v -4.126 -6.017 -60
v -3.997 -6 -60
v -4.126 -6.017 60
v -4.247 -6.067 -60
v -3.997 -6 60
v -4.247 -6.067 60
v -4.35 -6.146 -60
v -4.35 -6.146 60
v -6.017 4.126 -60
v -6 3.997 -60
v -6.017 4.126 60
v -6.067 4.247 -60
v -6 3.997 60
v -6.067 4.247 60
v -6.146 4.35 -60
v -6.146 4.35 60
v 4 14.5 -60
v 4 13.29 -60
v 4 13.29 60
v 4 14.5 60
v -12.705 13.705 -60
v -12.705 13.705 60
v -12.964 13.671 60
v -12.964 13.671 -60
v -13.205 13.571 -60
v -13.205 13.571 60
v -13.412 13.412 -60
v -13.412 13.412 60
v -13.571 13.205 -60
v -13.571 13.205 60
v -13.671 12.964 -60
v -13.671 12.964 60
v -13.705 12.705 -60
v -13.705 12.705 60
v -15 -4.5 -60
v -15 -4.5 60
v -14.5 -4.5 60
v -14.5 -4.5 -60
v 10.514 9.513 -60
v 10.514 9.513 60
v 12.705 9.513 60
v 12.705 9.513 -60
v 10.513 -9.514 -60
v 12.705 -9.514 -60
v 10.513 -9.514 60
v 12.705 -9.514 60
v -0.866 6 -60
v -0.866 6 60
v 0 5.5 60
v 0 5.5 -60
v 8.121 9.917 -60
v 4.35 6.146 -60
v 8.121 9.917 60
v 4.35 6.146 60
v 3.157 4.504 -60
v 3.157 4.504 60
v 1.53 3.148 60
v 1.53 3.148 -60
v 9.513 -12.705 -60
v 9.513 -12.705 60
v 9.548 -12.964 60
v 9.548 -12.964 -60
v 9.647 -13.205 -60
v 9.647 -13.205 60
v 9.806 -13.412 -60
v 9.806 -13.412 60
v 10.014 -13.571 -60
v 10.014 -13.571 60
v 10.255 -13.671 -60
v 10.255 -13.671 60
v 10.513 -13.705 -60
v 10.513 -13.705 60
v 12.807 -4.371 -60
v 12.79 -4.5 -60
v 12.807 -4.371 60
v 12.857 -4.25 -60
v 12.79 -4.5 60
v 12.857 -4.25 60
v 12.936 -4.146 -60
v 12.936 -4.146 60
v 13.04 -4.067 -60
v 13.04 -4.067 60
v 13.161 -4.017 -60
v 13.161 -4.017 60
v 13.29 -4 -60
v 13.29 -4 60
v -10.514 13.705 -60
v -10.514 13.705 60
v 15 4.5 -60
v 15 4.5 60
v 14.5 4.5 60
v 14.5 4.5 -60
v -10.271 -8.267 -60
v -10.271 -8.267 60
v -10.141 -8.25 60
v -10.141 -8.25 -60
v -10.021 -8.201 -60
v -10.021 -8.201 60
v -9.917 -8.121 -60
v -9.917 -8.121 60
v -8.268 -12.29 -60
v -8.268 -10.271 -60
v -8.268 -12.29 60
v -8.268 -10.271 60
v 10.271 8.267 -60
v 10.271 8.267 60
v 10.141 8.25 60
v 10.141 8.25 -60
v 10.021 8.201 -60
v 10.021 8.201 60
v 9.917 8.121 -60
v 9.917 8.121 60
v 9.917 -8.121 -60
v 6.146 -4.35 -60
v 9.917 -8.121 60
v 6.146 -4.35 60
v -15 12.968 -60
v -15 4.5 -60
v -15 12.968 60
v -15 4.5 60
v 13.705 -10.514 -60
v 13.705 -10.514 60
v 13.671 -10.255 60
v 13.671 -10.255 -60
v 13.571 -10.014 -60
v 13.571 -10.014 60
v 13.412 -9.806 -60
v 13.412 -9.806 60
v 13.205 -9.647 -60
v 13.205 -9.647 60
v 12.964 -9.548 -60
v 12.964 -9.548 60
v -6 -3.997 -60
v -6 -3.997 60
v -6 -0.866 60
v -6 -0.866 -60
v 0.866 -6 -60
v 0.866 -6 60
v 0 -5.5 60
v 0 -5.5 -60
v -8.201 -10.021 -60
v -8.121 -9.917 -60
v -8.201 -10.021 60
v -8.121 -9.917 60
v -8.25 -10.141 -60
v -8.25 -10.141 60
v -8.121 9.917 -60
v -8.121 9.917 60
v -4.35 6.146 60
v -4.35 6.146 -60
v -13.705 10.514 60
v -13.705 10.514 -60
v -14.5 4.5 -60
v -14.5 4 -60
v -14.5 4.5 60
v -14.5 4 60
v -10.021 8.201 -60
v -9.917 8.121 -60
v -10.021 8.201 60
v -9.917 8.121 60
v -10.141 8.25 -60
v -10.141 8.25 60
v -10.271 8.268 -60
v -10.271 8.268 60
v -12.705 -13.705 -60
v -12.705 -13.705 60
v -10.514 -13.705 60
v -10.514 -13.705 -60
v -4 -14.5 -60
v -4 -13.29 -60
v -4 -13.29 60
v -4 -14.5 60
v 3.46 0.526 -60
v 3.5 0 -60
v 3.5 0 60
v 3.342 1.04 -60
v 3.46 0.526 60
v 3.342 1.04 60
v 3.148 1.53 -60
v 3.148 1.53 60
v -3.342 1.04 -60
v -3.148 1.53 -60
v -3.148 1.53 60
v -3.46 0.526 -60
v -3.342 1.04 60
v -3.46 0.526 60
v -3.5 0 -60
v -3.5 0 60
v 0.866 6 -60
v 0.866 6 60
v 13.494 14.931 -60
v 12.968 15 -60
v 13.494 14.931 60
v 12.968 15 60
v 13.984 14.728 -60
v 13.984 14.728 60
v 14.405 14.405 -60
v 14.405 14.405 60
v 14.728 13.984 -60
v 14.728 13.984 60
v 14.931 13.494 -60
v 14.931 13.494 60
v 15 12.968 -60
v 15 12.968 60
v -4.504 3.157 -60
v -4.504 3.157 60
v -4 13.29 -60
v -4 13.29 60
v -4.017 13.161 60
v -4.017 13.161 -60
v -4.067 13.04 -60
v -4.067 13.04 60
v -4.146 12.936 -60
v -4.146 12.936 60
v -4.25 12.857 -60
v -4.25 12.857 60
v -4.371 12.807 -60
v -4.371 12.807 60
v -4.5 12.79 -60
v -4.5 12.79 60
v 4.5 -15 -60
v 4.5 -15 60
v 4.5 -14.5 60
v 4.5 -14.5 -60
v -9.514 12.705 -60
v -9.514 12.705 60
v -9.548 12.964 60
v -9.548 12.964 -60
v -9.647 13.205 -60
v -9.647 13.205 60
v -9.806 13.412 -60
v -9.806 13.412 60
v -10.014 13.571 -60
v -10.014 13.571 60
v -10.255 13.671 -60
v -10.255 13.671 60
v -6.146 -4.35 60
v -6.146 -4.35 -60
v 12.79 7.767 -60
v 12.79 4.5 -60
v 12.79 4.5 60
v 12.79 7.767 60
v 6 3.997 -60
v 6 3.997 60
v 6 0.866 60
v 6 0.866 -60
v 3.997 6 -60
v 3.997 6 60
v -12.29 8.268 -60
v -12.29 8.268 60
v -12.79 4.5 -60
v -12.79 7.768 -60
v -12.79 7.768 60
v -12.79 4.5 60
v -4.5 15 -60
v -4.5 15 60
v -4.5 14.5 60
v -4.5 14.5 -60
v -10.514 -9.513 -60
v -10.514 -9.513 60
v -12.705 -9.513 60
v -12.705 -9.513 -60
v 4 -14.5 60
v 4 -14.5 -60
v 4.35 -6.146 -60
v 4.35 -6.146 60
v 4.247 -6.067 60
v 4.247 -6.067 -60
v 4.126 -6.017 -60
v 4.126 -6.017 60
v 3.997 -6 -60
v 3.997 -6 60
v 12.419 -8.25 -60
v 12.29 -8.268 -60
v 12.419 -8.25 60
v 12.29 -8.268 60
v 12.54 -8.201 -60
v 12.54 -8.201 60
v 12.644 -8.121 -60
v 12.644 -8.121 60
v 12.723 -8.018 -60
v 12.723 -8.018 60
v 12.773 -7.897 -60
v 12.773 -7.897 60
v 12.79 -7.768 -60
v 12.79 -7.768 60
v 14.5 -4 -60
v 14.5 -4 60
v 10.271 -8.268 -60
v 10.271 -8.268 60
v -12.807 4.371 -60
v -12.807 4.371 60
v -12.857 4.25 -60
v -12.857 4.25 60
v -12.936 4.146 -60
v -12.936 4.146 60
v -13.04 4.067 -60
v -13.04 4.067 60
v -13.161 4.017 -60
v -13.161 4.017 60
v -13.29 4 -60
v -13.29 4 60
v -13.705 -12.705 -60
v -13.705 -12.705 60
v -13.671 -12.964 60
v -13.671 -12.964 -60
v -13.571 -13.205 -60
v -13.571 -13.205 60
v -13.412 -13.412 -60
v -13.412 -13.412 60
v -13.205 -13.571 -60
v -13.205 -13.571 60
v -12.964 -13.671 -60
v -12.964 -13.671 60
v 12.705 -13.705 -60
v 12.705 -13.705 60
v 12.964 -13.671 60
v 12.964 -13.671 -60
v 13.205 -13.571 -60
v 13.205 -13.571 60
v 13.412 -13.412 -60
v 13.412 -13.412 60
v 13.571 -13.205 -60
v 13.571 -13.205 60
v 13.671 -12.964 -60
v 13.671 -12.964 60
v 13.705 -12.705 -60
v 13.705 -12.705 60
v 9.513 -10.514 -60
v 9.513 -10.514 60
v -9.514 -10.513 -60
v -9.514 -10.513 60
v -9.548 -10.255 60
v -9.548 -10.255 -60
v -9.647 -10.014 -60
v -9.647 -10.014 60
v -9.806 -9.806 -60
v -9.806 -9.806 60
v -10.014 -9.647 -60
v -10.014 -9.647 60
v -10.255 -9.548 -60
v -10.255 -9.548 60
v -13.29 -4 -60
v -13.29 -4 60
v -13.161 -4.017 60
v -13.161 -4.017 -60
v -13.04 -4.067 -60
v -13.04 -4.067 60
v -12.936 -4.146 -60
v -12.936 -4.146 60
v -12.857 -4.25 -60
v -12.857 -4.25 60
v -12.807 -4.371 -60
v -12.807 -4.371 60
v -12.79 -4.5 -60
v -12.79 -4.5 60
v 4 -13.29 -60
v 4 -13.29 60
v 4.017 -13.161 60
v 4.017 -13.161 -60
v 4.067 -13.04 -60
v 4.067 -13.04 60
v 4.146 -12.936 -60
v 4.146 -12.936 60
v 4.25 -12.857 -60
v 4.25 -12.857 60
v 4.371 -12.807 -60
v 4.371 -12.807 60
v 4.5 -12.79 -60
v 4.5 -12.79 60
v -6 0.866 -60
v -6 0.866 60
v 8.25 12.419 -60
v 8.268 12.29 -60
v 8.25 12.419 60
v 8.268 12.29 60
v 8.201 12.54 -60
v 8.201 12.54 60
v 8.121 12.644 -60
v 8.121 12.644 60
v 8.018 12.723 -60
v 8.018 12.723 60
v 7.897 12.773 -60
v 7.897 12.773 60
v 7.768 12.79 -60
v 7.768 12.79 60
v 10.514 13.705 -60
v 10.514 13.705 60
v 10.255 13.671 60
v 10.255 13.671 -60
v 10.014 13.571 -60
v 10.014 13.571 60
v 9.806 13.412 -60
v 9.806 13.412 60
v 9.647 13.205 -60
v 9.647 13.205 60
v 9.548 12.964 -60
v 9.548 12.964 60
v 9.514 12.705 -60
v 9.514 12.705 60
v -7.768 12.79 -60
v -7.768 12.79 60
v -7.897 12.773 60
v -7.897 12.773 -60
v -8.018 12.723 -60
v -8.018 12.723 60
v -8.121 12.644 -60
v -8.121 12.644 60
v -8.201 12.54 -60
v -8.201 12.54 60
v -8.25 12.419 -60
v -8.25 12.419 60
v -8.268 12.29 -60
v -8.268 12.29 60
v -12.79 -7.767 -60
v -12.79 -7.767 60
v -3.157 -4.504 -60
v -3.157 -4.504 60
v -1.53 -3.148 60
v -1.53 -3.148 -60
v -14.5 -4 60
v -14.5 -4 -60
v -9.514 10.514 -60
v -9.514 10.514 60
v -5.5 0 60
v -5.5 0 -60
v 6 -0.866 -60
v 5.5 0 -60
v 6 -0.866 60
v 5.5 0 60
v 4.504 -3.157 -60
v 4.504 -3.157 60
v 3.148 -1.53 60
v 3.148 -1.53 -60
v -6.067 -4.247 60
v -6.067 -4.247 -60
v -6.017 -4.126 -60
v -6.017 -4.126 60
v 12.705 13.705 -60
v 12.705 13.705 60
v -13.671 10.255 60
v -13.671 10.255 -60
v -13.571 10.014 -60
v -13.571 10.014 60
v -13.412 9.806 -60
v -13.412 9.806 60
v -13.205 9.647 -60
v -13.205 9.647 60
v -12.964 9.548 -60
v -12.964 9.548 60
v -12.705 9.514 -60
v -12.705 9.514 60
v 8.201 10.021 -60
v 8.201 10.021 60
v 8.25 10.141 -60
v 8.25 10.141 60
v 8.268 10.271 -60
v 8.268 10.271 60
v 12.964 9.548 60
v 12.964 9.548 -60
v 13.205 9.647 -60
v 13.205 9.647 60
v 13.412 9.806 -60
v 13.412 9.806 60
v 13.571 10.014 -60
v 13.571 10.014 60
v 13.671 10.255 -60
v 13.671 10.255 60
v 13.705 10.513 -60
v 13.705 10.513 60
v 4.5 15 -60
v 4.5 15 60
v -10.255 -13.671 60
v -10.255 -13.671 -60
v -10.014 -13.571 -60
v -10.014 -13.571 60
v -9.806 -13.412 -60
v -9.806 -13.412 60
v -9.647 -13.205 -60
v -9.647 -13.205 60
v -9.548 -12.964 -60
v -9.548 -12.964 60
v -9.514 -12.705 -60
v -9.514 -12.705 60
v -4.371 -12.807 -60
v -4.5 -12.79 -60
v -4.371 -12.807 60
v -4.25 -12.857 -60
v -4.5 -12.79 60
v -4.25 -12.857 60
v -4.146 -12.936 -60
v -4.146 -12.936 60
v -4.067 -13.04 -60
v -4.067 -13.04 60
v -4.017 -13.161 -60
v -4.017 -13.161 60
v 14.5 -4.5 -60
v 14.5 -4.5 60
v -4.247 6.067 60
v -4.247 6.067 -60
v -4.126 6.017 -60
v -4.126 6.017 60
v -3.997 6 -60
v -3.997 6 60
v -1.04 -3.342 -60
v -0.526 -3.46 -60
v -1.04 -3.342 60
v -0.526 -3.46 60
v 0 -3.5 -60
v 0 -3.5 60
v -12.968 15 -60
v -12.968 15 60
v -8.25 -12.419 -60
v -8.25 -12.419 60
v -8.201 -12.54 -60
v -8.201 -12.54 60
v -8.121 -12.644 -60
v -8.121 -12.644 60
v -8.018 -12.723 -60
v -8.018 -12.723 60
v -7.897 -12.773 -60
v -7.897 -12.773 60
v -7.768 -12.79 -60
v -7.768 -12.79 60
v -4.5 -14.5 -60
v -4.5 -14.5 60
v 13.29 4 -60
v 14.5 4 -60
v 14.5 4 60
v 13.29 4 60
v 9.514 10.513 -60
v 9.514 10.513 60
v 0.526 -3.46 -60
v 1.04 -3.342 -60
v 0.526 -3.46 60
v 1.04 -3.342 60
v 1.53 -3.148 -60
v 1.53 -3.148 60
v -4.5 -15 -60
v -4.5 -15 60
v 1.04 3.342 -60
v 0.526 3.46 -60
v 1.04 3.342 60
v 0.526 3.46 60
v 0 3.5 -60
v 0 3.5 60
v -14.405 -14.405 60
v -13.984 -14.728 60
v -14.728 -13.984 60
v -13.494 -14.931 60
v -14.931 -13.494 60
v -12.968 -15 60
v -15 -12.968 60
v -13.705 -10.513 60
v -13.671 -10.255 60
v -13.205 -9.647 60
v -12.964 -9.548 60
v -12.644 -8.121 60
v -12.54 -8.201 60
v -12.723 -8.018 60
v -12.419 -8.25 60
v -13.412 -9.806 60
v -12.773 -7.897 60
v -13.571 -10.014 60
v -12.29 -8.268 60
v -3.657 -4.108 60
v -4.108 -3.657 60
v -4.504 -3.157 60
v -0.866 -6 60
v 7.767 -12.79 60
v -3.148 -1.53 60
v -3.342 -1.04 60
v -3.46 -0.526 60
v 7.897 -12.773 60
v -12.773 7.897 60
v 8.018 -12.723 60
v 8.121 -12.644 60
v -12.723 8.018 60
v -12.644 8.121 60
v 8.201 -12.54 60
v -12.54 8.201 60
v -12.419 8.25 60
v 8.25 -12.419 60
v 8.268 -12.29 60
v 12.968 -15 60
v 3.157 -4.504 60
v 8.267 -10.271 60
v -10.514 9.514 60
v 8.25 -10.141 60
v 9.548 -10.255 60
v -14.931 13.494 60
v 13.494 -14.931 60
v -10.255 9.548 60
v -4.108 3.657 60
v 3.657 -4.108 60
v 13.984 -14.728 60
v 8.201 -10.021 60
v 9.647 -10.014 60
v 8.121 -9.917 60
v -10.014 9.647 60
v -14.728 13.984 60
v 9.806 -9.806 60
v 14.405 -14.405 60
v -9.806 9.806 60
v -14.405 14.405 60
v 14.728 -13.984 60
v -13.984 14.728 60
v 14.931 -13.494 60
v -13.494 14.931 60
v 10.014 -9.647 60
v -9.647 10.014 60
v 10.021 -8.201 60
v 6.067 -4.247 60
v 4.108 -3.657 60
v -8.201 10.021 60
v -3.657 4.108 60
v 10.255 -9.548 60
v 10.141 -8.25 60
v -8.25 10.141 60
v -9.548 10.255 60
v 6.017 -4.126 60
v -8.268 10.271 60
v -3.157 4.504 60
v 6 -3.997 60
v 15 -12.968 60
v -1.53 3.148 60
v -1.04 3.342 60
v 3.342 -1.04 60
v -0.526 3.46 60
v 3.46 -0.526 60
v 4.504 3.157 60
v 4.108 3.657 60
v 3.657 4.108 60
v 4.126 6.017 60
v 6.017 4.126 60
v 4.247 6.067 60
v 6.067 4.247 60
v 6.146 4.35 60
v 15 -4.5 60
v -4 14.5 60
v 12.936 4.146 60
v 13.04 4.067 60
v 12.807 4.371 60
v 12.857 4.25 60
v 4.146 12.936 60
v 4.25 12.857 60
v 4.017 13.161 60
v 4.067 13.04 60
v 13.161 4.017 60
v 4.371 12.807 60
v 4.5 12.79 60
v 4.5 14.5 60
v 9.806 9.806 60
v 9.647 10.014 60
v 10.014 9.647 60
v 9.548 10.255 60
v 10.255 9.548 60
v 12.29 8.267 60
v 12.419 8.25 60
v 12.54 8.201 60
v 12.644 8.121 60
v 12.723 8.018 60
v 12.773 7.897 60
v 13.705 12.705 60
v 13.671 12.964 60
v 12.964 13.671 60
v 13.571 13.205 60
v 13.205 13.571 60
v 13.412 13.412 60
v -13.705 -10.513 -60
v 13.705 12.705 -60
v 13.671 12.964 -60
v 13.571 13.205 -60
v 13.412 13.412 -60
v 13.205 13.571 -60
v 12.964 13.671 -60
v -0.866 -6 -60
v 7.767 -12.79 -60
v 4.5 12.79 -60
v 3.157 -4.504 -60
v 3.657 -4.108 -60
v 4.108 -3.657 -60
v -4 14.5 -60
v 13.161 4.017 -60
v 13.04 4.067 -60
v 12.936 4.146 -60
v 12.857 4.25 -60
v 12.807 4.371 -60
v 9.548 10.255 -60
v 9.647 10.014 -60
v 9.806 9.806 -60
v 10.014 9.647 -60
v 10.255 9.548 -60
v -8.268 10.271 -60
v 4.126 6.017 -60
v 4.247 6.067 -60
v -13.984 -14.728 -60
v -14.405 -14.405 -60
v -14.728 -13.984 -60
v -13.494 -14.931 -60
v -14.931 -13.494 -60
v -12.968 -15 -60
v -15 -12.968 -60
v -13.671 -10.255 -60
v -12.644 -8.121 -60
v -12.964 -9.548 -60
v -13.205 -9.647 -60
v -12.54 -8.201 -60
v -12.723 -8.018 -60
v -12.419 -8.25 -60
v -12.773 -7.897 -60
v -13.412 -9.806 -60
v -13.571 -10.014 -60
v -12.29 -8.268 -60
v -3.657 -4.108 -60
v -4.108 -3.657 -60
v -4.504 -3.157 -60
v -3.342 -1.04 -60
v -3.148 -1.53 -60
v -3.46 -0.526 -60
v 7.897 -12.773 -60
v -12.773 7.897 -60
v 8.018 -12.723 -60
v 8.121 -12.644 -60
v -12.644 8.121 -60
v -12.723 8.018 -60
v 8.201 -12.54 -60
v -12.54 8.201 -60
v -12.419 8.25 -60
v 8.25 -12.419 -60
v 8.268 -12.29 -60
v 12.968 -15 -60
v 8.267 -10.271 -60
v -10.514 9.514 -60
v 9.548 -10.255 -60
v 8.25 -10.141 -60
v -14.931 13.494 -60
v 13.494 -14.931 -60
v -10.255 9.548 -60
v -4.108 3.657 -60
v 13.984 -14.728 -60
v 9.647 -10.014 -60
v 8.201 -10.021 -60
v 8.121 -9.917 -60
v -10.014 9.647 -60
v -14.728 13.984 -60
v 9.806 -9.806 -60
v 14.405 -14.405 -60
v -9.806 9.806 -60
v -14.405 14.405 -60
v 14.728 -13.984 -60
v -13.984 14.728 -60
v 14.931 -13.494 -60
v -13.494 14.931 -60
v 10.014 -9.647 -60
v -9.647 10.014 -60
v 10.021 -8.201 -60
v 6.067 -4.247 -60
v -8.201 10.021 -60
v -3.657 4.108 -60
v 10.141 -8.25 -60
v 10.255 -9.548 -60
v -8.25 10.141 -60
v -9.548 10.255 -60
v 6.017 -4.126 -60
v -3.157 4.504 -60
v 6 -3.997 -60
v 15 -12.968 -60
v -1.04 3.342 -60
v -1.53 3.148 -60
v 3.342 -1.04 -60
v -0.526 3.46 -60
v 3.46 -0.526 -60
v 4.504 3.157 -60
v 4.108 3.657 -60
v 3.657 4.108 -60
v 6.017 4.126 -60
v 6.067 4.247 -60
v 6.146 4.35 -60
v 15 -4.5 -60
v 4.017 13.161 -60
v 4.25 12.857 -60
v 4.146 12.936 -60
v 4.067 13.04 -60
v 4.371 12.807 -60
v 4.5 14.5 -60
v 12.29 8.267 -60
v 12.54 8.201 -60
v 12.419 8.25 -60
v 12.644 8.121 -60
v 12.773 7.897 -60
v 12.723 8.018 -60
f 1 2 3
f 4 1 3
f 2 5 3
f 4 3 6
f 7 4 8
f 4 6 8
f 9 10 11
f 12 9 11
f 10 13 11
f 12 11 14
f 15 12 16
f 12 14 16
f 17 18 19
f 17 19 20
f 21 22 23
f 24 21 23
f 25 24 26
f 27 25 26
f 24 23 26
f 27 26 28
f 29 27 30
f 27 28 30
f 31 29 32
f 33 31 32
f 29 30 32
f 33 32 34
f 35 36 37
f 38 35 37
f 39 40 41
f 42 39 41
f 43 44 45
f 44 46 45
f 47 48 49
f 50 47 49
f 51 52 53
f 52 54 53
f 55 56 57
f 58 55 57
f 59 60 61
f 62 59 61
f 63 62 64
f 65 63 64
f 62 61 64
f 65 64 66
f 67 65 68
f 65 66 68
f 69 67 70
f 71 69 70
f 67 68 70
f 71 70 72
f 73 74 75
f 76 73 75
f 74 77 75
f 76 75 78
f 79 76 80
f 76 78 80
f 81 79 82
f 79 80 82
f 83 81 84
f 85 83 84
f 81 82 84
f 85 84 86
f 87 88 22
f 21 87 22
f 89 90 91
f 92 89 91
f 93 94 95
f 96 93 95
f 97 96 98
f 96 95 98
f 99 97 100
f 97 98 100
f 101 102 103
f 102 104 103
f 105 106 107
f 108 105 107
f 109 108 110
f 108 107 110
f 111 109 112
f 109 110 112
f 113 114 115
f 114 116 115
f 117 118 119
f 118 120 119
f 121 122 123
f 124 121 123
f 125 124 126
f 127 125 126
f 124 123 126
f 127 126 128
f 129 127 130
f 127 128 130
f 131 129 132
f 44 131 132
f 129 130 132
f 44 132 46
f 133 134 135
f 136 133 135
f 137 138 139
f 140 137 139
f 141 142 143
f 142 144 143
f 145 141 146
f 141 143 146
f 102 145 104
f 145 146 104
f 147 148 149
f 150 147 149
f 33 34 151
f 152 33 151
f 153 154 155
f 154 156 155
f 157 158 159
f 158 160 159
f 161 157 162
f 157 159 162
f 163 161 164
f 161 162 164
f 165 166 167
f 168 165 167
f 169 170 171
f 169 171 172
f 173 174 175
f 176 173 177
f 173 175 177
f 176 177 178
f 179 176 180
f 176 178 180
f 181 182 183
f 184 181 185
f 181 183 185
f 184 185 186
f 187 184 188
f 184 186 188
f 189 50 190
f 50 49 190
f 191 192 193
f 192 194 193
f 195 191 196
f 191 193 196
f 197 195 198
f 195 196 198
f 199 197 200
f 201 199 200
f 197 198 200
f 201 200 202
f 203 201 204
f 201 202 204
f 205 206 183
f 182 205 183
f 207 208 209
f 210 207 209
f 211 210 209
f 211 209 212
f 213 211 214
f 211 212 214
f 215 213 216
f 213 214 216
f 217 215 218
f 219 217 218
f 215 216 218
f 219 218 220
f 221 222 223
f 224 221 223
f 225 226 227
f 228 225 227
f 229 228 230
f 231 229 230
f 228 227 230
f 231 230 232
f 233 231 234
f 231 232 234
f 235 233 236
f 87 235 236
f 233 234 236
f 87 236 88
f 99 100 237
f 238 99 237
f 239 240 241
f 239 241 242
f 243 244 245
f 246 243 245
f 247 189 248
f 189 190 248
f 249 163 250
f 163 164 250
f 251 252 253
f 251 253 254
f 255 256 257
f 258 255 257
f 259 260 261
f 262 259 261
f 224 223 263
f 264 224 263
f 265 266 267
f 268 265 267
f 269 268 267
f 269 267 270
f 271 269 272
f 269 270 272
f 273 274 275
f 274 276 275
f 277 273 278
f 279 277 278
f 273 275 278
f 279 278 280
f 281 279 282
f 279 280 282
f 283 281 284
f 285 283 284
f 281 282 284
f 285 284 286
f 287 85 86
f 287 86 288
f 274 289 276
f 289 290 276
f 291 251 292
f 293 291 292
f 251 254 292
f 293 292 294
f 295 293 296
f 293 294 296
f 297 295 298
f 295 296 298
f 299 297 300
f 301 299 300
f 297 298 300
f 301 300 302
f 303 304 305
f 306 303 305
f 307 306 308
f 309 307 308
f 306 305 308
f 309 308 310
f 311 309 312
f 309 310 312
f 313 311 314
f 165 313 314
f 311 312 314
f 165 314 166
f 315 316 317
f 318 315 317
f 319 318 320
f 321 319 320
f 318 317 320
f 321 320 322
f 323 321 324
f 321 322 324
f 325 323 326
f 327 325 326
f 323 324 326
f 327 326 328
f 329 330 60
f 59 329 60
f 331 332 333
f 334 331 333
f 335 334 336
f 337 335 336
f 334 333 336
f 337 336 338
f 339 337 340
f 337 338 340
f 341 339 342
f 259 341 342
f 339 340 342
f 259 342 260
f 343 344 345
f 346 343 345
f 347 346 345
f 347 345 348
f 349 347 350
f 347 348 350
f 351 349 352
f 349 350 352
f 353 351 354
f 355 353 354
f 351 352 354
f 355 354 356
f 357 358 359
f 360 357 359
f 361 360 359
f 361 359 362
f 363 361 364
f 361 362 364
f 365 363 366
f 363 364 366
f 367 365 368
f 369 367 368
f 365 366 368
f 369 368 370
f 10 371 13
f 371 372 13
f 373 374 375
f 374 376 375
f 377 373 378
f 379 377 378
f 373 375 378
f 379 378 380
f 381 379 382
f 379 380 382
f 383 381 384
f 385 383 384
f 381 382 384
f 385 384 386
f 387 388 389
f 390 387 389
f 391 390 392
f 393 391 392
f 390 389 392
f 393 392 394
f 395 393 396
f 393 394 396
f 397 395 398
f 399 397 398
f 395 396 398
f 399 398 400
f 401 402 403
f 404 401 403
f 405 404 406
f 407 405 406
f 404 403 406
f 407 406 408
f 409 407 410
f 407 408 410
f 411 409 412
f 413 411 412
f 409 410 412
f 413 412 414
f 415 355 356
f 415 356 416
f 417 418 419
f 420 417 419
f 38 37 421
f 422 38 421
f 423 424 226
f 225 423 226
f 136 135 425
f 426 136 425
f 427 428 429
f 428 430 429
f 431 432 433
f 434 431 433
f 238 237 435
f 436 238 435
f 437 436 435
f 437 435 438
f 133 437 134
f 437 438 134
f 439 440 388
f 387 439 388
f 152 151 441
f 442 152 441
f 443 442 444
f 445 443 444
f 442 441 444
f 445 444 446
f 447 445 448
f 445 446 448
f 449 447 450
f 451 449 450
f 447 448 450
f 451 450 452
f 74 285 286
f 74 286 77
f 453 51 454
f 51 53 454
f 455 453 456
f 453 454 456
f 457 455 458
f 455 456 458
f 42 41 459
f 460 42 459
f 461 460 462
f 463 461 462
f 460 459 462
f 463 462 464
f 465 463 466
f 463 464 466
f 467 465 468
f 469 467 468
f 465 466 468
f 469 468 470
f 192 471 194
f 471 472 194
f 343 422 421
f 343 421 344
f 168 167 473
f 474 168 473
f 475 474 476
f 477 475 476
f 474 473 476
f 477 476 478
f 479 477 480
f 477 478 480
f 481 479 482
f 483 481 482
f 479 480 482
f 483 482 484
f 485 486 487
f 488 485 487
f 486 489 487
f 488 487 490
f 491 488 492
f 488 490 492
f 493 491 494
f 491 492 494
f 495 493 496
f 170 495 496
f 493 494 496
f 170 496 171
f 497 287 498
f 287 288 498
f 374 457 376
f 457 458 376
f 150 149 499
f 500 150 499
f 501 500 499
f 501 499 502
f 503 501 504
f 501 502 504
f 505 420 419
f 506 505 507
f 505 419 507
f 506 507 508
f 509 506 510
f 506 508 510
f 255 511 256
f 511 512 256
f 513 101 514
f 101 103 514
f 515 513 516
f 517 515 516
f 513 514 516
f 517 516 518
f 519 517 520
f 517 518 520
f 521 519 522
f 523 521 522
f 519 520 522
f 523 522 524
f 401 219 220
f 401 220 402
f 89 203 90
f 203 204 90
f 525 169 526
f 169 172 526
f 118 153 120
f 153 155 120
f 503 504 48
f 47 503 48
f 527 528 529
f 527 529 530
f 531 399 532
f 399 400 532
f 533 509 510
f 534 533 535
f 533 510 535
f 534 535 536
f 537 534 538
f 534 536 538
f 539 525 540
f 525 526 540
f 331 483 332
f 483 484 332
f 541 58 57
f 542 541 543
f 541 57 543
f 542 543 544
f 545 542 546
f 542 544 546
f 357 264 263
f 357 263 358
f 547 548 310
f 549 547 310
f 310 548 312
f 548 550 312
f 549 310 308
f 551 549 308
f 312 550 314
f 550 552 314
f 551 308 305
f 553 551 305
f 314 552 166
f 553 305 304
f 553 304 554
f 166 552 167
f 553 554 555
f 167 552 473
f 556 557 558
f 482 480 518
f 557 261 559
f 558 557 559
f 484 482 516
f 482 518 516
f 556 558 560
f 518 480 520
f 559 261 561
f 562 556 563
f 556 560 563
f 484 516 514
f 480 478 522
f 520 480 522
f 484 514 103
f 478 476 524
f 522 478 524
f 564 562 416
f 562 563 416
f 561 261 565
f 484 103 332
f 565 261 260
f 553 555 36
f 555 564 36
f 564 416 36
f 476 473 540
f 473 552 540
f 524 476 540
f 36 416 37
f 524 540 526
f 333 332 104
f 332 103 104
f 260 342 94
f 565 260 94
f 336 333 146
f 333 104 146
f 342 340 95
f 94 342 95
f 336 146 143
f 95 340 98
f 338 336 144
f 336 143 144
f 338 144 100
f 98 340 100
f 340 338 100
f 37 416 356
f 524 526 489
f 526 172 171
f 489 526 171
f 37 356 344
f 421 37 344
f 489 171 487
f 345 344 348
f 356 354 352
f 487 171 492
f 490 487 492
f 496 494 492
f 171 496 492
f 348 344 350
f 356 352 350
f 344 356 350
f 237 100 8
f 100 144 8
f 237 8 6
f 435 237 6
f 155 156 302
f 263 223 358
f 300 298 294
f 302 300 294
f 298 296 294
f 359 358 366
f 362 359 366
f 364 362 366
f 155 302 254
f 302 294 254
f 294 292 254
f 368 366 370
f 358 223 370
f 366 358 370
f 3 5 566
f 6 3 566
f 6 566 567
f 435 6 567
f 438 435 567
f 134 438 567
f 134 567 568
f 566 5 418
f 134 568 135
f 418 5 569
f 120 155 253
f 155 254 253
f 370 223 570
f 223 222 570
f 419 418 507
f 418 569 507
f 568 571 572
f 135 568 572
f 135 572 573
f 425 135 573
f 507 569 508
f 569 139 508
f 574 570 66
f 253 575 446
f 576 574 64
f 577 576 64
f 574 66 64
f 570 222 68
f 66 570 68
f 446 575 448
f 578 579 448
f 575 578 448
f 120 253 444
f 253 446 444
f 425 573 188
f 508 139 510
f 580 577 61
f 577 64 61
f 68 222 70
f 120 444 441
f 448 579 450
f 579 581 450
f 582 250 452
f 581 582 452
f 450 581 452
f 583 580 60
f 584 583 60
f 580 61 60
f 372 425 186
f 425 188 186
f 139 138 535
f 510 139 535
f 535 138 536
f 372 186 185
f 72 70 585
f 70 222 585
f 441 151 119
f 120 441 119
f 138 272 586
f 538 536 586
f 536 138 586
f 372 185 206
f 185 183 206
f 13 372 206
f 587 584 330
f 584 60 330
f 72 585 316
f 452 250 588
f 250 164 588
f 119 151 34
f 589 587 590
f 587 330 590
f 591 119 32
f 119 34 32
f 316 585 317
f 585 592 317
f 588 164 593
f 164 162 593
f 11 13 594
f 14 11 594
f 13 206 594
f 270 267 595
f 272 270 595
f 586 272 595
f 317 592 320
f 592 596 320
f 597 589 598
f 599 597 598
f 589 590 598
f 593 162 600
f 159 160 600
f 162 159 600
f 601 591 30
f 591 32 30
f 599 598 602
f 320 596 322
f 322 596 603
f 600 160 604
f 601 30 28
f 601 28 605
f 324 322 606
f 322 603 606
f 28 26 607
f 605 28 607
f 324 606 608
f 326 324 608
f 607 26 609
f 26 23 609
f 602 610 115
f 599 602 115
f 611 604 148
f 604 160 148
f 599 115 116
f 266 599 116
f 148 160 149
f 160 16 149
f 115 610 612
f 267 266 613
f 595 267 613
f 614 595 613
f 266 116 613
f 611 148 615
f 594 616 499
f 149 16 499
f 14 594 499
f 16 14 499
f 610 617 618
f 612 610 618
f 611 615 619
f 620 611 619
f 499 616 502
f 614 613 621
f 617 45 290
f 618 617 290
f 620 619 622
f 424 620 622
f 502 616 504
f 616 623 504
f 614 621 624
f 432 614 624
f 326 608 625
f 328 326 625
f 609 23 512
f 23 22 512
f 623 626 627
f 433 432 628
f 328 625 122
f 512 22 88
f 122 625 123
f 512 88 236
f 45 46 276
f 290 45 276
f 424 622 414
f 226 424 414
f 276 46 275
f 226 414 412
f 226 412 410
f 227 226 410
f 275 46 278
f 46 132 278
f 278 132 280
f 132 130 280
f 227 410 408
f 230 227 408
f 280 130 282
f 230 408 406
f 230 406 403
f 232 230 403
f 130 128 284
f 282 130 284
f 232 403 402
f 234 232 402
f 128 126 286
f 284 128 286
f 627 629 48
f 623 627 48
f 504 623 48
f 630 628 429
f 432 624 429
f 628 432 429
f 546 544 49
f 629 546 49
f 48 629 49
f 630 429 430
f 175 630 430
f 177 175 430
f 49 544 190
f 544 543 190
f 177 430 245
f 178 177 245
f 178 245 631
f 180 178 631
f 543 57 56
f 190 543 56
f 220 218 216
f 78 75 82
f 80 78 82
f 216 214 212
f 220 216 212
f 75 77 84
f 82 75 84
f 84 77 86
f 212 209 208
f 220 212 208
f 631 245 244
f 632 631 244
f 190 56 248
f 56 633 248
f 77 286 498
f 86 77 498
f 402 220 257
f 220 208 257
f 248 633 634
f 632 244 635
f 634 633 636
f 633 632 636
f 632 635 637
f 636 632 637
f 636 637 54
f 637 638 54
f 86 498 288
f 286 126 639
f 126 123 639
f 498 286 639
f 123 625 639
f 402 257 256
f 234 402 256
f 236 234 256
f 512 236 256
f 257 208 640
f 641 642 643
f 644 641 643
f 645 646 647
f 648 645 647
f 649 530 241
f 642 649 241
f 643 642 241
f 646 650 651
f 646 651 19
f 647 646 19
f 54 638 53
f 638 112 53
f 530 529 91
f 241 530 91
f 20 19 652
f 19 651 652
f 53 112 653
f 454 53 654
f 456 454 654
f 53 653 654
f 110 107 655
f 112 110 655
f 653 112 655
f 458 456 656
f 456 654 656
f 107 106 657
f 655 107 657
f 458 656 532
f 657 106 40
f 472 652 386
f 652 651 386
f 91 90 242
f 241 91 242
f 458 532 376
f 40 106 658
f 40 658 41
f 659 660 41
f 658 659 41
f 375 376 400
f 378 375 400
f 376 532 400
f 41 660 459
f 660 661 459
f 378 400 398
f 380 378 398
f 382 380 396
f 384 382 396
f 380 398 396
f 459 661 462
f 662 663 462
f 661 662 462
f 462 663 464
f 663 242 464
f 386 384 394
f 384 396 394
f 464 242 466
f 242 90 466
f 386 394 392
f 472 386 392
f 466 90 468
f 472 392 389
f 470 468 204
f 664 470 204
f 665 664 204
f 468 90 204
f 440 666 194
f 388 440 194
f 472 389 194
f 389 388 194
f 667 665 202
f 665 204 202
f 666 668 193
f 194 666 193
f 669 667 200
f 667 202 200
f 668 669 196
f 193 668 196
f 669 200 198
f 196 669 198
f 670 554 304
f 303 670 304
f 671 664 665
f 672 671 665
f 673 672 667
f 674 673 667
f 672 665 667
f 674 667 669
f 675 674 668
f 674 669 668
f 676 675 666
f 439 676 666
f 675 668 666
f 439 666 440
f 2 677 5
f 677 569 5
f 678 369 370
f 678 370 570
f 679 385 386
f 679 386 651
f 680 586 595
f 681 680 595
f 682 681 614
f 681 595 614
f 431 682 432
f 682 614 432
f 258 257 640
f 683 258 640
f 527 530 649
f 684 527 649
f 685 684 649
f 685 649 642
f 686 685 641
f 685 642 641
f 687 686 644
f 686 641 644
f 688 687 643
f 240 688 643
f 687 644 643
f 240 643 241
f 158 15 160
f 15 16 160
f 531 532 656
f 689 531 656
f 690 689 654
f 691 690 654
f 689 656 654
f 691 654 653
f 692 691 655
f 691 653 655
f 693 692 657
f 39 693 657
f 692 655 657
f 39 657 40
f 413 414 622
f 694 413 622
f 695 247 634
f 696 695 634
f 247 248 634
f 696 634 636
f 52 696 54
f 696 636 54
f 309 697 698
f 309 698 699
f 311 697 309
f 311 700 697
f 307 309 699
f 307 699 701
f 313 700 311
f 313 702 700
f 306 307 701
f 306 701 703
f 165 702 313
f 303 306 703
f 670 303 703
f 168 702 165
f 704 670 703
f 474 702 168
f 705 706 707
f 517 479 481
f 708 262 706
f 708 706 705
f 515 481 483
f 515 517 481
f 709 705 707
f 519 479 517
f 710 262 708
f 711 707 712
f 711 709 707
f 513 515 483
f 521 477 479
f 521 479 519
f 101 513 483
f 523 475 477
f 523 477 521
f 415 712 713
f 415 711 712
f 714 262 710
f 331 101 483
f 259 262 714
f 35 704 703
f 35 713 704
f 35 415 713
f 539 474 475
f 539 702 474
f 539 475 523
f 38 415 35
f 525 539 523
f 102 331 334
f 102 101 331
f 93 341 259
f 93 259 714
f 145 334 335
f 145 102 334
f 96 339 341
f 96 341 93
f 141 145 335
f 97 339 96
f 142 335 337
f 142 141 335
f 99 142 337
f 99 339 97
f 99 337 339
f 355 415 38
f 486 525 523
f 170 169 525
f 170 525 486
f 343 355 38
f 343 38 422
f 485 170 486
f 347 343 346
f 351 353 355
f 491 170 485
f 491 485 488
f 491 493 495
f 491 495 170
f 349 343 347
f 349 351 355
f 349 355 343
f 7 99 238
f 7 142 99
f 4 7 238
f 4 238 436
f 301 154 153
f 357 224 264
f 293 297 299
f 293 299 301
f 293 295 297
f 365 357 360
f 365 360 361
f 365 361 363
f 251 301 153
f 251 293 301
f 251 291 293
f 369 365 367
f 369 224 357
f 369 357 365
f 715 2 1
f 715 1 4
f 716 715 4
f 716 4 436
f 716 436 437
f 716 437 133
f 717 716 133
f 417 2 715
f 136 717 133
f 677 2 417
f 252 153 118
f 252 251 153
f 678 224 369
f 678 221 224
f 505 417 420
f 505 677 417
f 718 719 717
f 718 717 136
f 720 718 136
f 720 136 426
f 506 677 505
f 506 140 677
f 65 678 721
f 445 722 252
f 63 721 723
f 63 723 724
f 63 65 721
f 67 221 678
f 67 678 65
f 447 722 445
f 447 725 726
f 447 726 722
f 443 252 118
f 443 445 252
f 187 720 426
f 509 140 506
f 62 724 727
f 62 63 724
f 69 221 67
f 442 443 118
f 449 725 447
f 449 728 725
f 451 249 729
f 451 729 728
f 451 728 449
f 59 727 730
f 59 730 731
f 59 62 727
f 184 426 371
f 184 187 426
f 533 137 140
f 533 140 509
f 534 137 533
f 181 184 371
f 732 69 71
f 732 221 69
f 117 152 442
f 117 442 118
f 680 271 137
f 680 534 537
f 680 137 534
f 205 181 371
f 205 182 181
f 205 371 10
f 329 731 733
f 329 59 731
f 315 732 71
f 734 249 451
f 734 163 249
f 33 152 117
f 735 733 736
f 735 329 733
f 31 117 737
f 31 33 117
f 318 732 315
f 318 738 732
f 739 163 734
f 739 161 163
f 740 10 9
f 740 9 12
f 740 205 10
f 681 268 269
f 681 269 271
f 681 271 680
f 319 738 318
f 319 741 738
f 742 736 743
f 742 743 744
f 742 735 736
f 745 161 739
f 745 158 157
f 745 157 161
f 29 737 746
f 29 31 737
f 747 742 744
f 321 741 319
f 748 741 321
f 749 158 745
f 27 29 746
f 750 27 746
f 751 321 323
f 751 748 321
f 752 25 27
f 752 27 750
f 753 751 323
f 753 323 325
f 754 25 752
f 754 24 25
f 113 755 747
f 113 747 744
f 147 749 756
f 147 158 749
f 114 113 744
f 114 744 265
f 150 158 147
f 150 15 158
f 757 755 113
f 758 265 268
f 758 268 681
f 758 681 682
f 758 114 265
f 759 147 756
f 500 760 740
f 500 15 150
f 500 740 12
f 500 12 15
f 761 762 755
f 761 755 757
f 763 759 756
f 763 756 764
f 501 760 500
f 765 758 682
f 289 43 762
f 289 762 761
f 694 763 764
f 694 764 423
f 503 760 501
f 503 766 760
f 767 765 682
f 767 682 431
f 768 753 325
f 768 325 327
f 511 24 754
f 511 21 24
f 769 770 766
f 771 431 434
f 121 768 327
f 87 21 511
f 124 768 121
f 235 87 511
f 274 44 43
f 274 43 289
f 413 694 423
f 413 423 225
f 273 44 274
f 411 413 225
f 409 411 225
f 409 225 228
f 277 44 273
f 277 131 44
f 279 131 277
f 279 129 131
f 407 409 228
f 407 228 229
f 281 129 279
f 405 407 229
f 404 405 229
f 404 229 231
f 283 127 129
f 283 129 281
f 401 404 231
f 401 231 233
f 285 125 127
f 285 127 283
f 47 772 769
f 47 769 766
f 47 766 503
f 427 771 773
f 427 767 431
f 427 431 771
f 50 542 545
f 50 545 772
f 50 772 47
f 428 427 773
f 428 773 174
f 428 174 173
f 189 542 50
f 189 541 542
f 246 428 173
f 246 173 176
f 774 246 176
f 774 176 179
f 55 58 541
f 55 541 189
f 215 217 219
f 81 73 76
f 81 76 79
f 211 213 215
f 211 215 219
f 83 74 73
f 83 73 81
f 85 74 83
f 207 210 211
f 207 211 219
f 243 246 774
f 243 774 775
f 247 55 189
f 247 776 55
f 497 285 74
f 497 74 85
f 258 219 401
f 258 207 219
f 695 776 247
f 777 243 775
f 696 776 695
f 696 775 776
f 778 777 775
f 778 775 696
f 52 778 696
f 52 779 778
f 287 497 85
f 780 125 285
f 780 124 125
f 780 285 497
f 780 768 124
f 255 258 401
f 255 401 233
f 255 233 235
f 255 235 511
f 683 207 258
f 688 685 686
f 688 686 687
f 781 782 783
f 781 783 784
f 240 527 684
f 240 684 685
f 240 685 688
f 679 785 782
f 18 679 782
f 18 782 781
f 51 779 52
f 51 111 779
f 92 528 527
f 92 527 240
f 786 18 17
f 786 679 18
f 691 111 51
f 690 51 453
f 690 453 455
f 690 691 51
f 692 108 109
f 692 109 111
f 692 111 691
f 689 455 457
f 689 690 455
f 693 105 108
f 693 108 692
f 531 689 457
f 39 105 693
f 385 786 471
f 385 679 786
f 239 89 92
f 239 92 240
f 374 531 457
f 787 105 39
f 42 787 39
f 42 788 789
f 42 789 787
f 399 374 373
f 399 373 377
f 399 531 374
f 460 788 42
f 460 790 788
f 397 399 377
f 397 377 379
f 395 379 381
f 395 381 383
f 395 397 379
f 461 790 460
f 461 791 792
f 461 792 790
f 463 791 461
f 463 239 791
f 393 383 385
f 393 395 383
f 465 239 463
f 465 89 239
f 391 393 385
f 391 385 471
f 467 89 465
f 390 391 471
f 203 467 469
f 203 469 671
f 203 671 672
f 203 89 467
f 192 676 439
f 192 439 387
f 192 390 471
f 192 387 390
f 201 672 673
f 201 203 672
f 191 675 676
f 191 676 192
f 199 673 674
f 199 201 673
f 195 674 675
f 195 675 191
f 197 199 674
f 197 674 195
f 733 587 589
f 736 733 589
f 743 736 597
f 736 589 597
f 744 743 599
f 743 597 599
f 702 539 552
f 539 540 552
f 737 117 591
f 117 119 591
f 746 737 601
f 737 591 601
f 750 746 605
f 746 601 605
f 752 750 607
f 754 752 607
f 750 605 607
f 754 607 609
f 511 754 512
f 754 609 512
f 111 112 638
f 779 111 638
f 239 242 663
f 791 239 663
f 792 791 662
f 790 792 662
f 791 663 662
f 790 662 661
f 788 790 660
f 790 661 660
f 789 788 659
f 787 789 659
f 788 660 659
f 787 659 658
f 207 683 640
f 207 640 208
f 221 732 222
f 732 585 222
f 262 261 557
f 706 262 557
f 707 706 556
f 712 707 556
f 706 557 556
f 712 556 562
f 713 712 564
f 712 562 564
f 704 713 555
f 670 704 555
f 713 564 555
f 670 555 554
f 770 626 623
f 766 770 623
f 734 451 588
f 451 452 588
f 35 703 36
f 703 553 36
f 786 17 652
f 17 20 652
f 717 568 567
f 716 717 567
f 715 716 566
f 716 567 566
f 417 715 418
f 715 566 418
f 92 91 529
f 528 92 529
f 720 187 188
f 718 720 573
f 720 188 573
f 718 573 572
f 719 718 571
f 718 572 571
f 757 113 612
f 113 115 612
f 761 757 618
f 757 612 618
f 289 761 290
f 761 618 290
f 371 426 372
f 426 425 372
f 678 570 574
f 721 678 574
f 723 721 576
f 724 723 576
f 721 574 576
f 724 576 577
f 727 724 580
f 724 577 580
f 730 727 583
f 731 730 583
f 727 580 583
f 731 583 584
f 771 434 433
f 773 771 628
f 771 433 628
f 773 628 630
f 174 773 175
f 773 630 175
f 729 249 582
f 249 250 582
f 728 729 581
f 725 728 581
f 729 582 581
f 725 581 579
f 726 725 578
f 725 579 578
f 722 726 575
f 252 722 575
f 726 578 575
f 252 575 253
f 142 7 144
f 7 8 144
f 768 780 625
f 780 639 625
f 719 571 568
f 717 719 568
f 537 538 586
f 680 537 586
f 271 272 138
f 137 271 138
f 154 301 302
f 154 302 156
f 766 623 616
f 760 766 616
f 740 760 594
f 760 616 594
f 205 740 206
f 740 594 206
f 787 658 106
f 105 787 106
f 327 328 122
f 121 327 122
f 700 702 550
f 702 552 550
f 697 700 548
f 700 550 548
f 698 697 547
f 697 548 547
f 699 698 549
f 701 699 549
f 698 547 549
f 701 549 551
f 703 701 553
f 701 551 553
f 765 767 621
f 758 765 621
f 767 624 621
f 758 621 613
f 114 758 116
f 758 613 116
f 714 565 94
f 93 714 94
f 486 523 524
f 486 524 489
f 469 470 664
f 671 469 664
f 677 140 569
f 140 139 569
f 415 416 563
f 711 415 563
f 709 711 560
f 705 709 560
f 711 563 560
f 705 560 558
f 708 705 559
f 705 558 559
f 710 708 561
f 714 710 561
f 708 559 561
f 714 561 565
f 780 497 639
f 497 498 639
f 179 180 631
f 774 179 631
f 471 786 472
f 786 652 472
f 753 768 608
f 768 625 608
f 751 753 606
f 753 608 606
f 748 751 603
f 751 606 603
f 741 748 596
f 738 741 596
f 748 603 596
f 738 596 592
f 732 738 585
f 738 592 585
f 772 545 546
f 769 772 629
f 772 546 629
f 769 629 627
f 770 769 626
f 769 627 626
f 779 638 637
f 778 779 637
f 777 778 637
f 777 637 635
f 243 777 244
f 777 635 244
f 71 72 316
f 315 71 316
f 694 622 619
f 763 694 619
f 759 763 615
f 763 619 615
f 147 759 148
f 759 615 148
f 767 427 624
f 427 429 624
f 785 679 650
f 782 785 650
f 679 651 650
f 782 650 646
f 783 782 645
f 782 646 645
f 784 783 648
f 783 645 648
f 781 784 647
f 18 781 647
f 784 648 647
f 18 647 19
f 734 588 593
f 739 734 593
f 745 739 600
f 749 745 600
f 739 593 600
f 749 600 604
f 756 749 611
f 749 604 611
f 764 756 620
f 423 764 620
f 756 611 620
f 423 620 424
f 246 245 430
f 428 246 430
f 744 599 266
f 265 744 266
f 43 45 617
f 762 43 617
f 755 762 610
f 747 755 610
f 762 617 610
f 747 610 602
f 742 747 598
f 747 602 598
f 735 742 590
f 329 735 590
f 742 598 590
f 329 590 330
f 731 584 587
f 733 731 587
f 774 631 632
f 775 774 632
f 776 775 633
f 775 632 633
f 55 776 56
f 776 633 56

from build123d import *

# Parameters (mm, degrees)
BOSS_EXTRUDE1_DEPTH = 60
CIRPATTERN1_COUNT   = 4


with BuildPart() as part:
    # Sketch3 → Boss-Extrude1 (new, symmetric)
    with BuildSketch(Plane.XY):
        with BuildLine():
            Line((-4.503841895, 3.156803476), (-3.14772708, 1.530298739))
            ThreePointArc((-3.14772708, 1.530298739), (-3.410794979, 0.785160882), (-3.5, 0))
            Line((-3.5, 0), (-5.5, 0))
            Line((-5.5, 0), (-6, 0.866025404))
            Line((-6, 0.866025404), (-6, 3.996841995))
            ThreePointArc((-6, 3.996841995), (-6.038060234, 4.188183711), (-6.146446609, 4.350395385))
            Line((-6.146446609, 4.350395385), (-9.917104615, 8.121053391))
            ThreePointArc((-9.917104615, 8.121053391), (-10.079316289, 8.229439766), (-10.270658005, 8.2675))
            Line((-10.270658005, 8.2675), (-12.29, 8.2675))
            ThreePointArc((-12.29, 8.2675), (-12.643553391, 8.121053391), (-12.79, 7.7675))
            Line((-12.79, 7.7675), (-12.79, 4.5))
            ThreePointArc((-12.79, 4.5), (-12.936446609, 4.146446609), (-13.29, 4))
            Line((-13.29, 4), (-14.5, 4))
            Line((-14.5, 4), (-14.5, 4.5))
            Line((-14.5, 4.5), (-15, 4.5))
            Line((-15, 4.5), (-15, 12.968))
            ThreePointArc((-15, 12.968), (-14.404840979, 14.404840979), (-12.968, 15))
            Line((-12.968, 15), (-4.5, 15))
            Line((-4.5, 15), (-4.5, 14.5))
            Line((-4.5, 14.5), (-4, 14.5))
            Line((-4, 14.5), (-4, 13.29))
            ThreePointArc((-4, 13.29), (-4.146446609, 12.936446609), (-4.5, 12.79))
            Line((-4.5, 12.79), (-7.7675, 12.79))
            ThreePointArc((-7.7675, 12.79), (-8.121053391, 12.643553391), (-8.2675, 12.29))
            Line((-8.2675, 12.29), (-8.2675, 10.270658005))
            ThreePointArc((-8.2675, 10.270658005), (-8.229439766, 10.079316289), (-8.121053391, 9.917104615))
            Line((-8.121053391, 9.917104615), (-4.350395385, 6.146446609))
            ThreePointArc((-4.350395385, 6.146446609), (-4.188183711, 6.038060234), (-3.996841995, 6))
            Line((-3.996841995, 6), (-0.866025404, 6))
            Line((-0.866025404, 6), (0, 5.5))
            Line((0, 5.5), (0, 3.5))
            ThreePointArc((0, 3.5), (-0.785160882, 3.410794979), (-1.530298739, 3.14772708))
            Line((-1.530298739, 3.14772708), (-3.156803476, 4.503841895))
            ThreePointArc((-3.156803476, 4.503841895), (-3.889087297, 3.889087297), (-4.503841895, 3.156803476))
        make_face()
        with BuildLine():
            Line((-12.705, 9.5135), (-10.5135, 9.5135))
            ThreePointArc((-10.5135, 9.5135), (-9.806393219, 9.806393219), (-9.5135, 10.5135))
            Line((-9.5135, 10.5135), (-9.5135, 12.705))
            ThreePointArc((-9.5135, 12.705), (-9.806393219, 13.412106781), (-10.5135, 13.705))
            Line((-10.5135, 13.705), (-12.705, 13.705))
            ThreePointArc((-12.705, 13.705), (-13.412106781, 13.412106781), (-13.705, 12.705))
            Line((-13.705, 12.705), (-13.705, 10.5135))
            ThreePointArc((-13.705, 10.5135), (-13.412106781, 9.806393219), (-12.705, 9.5135))
        make_face(mode=Mode.SUBTRACT)
    boss_extrude1 = extrude(amount=BOSS_EXTRUDE1_DEPTH, both=True)

    # CirPattern1: Boss-Extrude1 ×4 about axis
    cirpattern1_axis = Axis((0, 0, 0), (0, 0, 1))
    for i in range(1, CIRPATTERN1_COUNT):
        add(boss_extrude1.rotate(cirpattern1_axis, i * 360 / CIRPATTERN1_COUNT))


solid = part.part
